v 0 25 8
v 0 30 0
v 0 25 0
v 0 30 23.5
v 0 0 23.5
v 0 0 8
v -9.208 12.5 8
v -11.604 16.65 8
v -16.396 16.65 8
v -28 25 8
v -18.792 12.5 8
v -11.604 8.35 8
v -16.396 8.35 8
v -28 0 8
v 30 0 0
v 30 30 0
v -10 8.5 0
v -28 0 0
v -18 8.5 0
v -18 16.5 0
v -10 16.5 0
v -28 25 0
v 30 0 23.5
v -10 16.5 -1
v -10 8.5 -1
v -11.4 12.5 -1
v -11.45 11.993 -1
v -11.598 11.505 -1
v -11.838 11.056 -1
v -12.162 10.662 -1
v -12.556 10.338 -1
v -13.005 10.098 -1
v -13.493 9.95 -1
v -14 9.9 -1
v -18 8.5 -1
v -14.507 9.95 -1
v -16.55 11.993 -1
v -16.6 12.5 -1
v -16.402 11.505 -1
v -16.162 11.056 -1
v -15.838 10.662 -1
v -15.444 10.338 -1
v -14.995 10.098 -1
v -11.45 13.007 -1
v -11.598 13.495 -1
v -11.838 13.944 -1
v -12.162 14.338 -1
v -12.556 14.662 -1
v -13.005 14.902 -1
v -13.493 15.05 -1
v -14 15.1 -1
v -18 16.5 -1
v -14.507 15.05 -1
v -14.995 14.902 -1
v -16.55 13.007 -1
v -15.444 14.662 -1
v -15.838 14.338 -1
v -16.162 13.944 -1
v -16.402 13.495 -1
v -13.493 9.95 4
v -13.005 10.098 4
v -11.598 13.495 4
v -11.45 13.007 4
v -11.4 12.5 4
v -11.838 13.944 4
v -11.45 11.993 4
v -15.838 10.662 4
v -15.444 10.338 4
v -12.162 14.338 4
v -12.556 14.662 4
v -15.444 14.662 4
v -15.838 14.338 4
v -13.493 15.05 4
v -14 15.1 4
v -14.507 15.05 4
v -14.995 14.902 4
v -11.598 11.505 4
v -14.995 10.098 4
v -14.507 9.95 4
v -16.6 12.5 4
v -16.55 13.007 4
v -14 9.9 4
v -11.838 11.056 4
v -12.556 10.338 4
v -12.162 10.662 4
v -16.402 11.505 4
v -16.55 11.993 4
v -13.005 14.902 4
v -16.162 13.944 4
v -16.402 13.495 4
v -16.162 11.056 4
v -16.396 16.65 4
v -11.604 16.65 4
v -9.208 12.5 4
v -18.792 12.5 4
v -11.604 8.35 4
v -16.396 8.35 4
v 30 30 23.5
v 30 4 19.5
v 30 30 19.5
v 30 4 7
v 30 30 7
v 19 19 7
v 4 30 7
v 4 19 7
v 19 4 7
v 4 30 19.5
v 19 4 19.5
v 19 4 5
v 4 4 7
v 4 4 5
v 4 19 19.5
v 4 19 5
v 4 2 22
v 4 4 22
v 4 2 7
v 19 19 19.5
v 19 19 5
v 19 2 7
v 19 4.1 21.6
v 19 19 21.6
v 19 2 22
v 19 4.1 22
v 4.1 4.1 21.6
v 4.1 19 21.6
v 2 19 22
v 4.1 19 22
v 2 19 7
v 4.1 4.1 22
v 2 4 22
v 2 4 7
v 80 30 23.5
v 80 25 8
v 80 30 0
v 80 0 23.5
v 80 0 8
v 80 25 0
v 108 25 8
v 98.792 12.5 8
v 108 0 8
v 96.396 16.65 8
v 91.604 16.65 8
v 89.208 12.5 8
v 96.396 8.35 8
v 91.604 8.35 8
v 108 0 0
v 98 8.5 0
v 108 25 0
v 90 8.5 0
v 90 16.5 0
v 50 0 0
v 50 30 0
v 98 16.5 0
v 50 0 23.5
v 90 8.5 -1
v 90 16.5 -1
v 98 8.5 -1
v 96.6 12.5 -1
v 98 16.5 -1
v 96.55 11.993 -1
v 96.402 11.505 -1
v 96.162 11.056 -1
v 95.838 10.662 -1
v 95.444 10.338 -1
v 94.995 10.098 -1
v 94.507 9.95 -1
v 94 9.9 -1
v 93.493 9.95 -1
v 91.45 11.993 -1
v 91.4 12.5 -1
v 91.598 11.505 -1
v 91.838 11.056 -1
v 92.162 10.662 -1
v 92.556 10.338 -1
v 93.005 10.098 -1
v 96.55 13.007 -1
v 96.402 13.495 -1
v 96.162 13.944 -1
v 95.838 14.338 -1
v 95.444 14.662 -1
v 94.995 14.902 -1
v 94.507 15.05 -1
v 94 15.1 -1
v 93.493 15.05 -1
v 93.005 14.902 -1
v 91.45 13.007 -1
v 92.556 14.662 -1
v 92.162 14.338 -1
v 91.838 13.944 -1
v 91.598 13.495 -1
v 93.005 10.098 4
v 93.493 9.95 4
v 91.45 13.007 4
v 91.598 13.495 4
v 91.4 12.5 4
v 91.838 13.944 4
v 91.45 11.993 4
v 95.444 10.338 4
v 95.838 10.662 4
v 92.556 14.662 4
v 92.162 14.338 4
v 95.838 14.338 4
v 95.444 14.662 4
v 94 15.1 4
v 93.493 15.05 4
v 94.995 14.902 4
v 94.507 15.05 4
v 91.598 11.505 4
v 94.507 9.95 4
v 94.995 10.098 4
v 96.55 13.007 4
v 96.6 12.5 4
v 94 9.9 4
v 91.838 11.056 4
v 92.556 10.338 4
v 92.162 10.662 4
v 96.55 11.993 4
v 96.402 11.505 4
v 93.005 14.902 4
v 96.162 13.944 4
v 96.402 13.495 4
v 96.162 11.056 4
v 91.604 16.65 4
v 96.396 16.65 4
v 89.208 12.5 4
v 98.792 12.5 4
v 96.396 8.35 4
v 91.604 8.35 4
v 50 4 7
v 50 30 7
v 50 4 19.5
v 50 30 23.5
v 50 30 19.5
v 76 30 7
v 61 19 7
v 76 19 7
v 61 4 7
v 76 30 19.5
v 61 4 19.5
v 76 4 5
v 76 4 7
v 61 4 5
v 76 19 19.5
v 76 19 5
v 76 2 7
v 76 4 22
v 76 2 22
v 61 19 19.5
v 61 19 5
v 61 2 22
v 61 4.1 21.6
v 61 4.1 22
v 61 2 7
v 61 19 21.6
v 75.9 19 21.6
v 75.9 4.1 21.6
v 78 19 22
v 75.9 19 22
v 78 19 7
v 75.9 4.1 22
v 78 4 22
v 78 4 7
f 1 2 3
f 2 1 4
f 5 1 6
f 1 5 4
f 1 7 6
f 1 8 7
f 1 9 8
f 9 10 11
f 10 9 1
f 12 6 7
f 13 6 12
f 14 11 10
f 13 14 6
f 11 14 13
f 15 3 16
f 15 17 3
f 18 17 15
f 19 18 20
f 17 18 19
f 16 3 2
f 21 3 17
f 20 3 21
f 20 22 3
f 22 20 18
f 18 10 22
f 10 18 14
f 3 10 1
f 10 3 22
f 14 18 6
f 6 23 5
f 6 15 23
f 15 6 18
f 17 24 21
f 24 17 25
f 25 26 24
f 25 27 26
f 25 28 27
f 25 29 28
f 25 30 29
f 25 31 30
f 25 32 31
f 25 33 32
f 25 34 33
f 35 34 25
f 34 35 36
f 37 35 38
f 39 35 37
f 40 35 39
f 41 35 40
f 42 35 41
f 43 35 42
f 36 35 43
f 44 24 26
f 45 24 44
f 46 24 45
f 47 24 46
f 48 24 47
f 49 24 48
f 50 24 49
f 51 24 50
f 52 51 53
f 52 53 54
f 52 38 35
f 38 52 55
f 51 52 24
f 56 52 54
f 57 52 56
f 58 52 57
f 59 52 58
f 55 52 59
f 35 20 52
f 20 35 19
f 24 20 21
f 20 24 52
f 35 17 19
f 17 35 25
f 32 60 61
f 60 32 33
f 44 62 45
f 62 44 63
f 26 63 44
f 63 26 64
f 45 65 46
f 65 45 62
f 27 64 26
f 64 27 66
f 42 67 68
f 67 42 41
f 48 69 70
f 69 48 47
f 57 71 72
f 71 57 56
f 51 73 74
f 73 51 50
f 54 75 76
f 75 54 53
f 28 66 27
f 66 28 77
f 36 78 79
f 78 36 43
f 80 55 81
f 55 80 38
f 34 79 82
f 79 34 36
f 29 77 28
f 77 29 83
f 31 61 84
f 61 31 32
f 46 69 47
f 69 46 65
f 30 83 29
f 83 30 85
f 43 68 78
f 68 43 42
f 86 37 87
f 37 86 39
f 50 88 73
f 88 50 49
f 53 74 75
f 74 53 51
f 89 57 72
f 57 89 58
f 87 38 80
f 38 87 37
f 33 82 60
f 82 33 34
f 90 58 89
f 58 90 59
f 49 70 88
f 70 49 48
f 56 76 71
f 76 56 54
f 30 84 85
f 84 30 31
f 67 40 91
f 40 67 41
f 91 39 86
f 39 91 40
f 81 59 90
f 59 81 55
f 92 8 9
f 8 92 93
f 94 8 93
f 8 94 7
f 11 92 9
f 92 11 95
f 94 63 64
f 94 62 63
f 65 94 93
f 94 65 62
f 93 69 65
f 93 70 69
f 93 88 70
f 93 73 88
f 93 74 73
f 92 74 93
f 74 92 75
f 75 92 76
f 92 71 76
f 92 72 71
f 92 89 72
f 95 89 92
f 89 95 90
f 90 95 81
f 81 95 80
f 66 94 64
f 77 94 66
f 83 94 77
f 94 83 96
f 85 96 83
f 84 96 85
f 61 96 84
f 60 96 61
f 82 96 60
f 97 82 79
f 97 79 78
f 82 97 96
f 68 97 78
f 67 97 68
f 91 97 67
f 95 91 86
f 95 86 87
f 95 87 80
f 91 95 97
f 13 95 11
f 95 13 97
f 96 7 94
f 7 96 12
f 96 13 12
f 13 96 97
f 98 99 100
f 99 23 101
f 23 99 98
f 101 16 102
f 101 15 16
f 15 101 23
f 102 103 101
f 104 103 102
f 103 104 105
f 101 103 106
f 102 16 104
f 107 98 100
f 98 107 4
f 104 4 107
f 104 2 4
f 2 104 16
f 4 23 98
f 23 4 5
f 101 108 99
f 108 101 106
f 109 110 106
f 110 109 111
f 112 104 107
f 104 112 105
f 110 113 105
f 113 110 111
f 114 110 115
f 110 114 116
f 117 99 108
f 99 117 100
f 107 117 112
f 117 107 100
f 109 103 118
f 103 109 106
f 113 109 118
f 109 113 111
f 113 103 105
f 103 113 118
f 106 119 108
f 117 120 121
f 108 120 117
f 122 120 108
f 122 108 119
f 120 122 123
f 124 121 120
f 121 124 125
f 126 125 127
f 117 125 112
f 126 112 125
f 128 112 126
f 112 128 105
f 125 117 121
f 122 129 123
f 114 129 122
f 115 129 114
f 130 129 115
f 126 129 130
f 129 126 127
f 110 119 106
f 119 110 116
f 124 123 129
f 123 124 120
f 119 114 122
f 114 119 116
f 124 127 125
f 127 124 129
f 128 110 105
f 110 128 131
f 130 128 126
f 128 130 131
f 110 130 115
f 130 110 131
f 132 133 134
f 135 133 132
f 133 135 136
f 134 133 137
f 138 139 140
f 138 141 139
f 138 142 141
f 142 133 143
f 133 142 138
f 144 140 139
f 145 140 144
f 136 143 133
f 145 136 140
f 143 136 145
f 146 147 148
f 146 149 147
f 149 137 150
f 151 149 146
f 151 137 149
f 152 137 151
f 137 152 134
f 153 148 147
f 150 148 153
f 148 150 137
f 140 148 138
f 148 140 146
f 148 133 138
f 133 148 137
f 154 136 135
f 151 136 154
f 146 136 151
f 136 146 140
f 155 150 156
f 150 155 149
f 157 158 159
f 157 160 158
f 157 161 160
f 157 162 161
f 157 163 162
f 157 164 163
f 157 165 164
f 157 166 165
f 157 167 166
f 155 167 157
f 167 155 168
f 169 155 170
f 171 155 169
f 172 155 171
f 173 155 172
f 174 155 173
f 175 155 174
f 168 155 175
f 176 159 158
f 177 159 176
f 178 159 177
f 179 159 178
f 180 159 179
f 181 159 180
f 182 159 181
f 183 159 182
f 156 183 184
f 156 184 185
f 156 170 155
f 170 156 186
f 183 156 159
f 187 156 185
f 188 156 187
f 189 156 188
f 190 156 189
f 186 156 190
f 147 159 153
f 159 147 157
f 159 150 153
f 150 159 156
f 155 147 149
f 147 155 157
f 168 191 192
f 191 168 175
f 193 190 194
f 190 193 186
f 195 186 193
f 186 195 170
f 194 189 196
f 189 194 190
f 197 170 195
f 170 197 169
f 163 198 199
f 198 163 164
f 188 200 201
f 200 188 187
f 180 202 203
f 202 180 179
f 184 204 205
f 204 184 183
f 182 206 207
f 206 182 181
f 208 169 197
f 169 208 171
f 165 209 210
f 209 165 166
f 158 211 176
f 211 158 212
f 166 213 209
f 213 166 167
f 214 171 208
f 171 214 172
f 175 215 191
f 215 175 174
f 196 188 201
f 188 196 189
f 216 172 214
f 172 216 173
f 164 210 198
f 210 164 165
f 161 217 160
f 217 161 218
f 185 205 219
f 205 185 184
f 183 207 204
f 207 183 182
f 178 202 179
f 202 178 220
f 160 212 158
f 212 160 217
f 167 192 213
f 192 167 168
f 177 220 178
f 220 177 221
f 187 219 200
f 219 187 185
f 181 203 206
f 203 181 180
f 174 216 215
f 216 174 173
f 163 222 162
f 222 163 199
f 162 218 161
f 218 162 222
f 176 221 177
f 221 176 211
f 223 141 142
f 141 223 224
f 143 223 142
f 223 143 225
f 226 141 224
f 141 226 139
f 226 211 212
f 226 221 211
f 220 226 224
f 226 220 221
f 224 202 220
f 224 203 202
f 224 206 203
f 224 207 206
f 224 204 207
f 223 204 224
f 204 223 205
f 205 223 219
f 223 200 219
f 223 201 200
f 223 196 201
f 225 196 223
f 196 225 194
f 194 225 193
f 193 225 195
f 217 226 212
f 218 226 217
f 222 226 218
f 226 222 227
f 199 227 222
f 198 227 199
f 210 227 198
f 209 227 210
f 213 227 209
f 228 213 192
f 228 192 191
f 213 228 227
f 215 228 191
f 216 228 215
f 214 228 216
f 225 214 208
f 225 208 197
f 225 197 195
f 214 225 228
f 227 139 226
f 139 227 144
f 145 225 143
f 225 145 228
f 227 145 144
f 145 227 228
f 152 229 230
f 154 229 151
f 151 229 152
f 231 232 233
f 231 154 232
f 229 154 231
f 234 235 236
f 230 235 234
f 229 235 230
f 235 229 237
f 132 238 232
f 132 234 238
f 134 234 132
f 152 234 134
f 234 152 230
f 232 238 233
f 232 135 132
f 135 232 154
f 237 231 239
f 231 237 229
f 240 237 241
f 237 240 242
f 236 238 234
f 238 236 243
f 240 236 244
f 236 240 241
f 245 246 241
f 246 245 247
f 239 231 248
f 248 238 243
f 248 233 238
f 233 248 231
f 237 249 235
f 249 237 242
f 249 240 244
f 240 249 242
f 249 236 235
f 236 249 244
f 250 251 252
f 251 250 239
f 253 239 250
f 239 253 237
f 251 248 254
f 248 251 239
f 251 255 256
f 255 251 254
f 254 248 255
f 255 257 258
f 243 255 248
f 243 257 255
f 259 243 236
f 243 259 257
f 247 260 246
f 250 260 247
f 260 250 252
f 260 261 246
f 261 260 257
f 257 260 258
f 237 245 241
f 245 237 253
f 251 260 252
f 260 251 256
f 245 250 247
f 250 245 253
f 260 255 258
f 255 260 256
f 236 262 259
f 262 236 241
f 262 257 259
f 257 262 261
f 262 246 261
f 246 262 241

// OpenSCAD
// file: ../lib/slot_mount.scad
// ============================================================
// Slot Mount Base Module
// ============================================================
// Reusable foundation for all shelf mounts
// Provides slot tab, mounting surface, M5 hole, and nut pocket

include <../params.scad>

module slot_mount_base() {
    // Horizontal base that sits on top of shelf
    // Need enough width for: slot tab + walls around nut pocket + channel side walls
    // Increased width provides more robust walls on sides of velcro channel
    base_width = 28;  // mm, provides 10mm wall on each side of slot tab
    base_depth = mount_body_d;
    base_height = mount_body_h;

    difference() {
        union() {
            // Main horizontal base body
            translate([0, 0, 0])
                cube([base_width, base_depth, base_height]);

            // Slot tab (extends downward from bottom of base)
            translate([(base_width - slot_tab_width) / 2,
                      (base_depth - slot_tab_width) / 2,
                      -slot_tab_depth])
                cube([slot_tab_width, slot_tab_width, slot_tab_depth]);
        }

        // M5 screw clearance hole (through entire base)
        translate([base_width / 2, base_depth / 2, -slot_tab_depth - 1])
            cylinder(h = base_height + slot_tab_depth + 2, d = m5_screw_d, $fn = 32);

        // Hex nut pocket (from top, side-loading style)
        // Using cos(30) to convert across-flats to circumradius
        translate([base_width / 2, base_depth / 2, base_height - m5_nut_h])
            cylinder(h = m5_nut_h + 1,
                    d = (m5_nut_w + nut_pocket_tol) / cos(30),
                    $fn = 6);
    }
}

// Test render
slot_mount_base();
// file: ../params.scad
// ============================================================
// Ham Radio Go Kit — OpenSCAD Parameters
// ============================================================

// ============================================================
// SHELF SLOT — MEASURED (configurable for other shelves)
// ============================================================
slot_width = 8.1;           // mm, slot opening width — MEASURED on Vevor shelf
slot_spacing = 5.0;         // mm, rail width between slots
shelf_thickness = 1.5;      // mm, shelf material thickness
slot_tab_width = 8.0;       // mm, tab width (fits in 8.1mm slot)
slot_tab_depth = 1.0;       // mm, tab depth - just prevents rotation, allows washer clearance
slot_tab_engage = 2.0;      // mm, minimum engagement depth for retention

// ============================================================
// M5 HARDWARE
// ============================================================
m5_screw_d = 5.2;           // mm, clearance hole diameter
m5_nut_w = 8.0;             // mm, hex nut width across flats
m5_nut_h = 4.0;             // mm, hex nut height
m5_washer_od = 10.0;        // mm, washer OD - verify clears slot

// ============================================================
// TOLERANCES
// ============================================================
fit_clearance = 0.2;        // mm, slot tab fit clearance
nut_pocket_tol = 0.3;       // mm, nut pocket oversize for capture

// ============================================================
// VELCRO STRAP MOUNTS
// ============================================================
velcro_width = 19.05;       // mm, 0.75" velcro - standardize all straps
velcro_channel_clearance = 1.0;  // mm, channel oversize
mount_body_w = 25.0;        // mm
mount_body_d = 25.0;        // mm
mount_body_h = 8.0;         // mm, sets max gear height that can be strapped

// ============================================================
// PINEBOOK PRO — measure closed unit with calipers
// ============================================================
pbp_w = 280.0;              // mm, width
pbp_d = 192.0;              // mm, depth
pbp_h = 12.0;               // mm, closed lid thickness — MEASURE
pbp_clearance = 0.5;        // mm, fit clearance inside captures

// L-mount (front, x2)
l_arm_thickness = 4.0;      // mm, horizontal arm thickness
l_arm_length = 15.0;        // mm, how far arm extends over laptop top

// Corner mount (rear, x2)
corner_wall_thickness = 4.0;  // mm
corner_wall_h = 20.0;         // mm, should be > pbp_h + corner_arm_thickness
corner_arm_length = 15.0;     // mm, top retention arm extends over laptop
corner_arm_thickness = 4.0;   // mm

// ============================================================
// MFJ-939 BRACKETS — measure on physical unit
// ============================================================
mfj939_chassis_w = 0.0;        // mm, outside width — MEASURE
mfj939_side_screw_d = 3.5;     // mm, #6-32 clearance hole — VERIFY
mfj939_side_screw_spacing = 0.0; // mm, fore/aft spacing between screw holes on side panel — MEASURE
mfj939_screw_height = 0.0;     // mm, screw centerline height above shelf surface — MEASURE

// Bracket geometry
bracket_foot_d = 25.0;         // mm, horizontal foot depth on shelf
bracket_foot_h = 8.0;          // mm, horizontal foot thickness
bracket_arm_thickness = 4.0;   // mm, vertical arm thickness
// main file
// ============================================================
// Pinebook Pro Rear Corner Mount
// ============================================================
// 4-sided box: floor, ceiling, and 2 perpendicular walls
// Slot mount tab attached to OUTSIDE of one wall
// Used in pairs at rear left and rear right corners

include <../params.scad>
use <../lib/slot_mount.scad>

module pinebook_corner_mount() {
    // Box dimensions - minimal size to catch corner
    wall_thickness = corner_wall_thickness;  // 4mm walls
    floor_thickness = 7;  // mm, thick floor
    ceiling_thickness = corner_arm_thickness;  // 4mm ceiling
    corner_size = 30;  // mm, internal size of box
    internal_height = pbp_h + pbp_clearance;  // Just tall enough for laptop thickness

    total_height = floor_thickness + internal_height + ceiling_thickness;

    // Padding recess dimensions
    padding_recess_depth = 2;  // mm, depth of recess for glued padding
    padding_recess_size = 15;  // mm, size of square recess

    difference() {
        union() {
            // Floor
            cube([corner_size, corner_size, floor_thickness]);

            // Wall 1 (along X axis)
            cube([corner_size, wall_thickness, total_height]);

            // Wall 2 (along Y axis)
            cube([wall_thickness, corner_size, total_height]);

            // Ceiling (top surface)
            translate([0, 0, floor_thickness + internal_height])
                cube([corner_size, corner_size, ceiling_thickness]);

            // Slot mount base extends out from floor as a continuation
            // Positioned to the left of wall 2 (in -X direction)
            translate([-base_width, 0, 0])
                slot_mount_base();
        }

        // Padding recesses for rubber/fabric protection
        // Recess in floor (top surface)
        translate([wall_thickness, wall_thickness, floor_thickness - padding_recess_depth])
            cube([padding_recess_size, padding_recess_size, padding_recess_depth + 0.1]);

        // Recess in ceiling (bottom surface)
        translate([wall_thickness, wall_thickness, floor_thickness + internal_height])
            cube([padding_recess_size, padding_recess_size, padding_recess_depth + 0.1]);

        // Recess in wall 1 (inside face)
        translate([wall_thickness, wall_thickness - padding_recess_depth, floor_thickness])
            cube([padding_recess_size, padding_recess_depth + 0.1, padding_recess_size]);

        // Recess in wall 2 (inside face)
        translate([wall_thickness - padding_recess_depth, wall_thickness, floor_thickness])
            cube([padding_recess_depth + 0.1, padding_recess_size, padding_recess_size]);
    }
}

// Helper to access base_width in this scope
base_width = 28;  // mm, matches slot_mount_base

// Render mirrored pair for printing
pinebook_corner_mount();

translate([80, 0, 0])
    mirror([1, 0, 0])
        pinebook_corner_mount();
